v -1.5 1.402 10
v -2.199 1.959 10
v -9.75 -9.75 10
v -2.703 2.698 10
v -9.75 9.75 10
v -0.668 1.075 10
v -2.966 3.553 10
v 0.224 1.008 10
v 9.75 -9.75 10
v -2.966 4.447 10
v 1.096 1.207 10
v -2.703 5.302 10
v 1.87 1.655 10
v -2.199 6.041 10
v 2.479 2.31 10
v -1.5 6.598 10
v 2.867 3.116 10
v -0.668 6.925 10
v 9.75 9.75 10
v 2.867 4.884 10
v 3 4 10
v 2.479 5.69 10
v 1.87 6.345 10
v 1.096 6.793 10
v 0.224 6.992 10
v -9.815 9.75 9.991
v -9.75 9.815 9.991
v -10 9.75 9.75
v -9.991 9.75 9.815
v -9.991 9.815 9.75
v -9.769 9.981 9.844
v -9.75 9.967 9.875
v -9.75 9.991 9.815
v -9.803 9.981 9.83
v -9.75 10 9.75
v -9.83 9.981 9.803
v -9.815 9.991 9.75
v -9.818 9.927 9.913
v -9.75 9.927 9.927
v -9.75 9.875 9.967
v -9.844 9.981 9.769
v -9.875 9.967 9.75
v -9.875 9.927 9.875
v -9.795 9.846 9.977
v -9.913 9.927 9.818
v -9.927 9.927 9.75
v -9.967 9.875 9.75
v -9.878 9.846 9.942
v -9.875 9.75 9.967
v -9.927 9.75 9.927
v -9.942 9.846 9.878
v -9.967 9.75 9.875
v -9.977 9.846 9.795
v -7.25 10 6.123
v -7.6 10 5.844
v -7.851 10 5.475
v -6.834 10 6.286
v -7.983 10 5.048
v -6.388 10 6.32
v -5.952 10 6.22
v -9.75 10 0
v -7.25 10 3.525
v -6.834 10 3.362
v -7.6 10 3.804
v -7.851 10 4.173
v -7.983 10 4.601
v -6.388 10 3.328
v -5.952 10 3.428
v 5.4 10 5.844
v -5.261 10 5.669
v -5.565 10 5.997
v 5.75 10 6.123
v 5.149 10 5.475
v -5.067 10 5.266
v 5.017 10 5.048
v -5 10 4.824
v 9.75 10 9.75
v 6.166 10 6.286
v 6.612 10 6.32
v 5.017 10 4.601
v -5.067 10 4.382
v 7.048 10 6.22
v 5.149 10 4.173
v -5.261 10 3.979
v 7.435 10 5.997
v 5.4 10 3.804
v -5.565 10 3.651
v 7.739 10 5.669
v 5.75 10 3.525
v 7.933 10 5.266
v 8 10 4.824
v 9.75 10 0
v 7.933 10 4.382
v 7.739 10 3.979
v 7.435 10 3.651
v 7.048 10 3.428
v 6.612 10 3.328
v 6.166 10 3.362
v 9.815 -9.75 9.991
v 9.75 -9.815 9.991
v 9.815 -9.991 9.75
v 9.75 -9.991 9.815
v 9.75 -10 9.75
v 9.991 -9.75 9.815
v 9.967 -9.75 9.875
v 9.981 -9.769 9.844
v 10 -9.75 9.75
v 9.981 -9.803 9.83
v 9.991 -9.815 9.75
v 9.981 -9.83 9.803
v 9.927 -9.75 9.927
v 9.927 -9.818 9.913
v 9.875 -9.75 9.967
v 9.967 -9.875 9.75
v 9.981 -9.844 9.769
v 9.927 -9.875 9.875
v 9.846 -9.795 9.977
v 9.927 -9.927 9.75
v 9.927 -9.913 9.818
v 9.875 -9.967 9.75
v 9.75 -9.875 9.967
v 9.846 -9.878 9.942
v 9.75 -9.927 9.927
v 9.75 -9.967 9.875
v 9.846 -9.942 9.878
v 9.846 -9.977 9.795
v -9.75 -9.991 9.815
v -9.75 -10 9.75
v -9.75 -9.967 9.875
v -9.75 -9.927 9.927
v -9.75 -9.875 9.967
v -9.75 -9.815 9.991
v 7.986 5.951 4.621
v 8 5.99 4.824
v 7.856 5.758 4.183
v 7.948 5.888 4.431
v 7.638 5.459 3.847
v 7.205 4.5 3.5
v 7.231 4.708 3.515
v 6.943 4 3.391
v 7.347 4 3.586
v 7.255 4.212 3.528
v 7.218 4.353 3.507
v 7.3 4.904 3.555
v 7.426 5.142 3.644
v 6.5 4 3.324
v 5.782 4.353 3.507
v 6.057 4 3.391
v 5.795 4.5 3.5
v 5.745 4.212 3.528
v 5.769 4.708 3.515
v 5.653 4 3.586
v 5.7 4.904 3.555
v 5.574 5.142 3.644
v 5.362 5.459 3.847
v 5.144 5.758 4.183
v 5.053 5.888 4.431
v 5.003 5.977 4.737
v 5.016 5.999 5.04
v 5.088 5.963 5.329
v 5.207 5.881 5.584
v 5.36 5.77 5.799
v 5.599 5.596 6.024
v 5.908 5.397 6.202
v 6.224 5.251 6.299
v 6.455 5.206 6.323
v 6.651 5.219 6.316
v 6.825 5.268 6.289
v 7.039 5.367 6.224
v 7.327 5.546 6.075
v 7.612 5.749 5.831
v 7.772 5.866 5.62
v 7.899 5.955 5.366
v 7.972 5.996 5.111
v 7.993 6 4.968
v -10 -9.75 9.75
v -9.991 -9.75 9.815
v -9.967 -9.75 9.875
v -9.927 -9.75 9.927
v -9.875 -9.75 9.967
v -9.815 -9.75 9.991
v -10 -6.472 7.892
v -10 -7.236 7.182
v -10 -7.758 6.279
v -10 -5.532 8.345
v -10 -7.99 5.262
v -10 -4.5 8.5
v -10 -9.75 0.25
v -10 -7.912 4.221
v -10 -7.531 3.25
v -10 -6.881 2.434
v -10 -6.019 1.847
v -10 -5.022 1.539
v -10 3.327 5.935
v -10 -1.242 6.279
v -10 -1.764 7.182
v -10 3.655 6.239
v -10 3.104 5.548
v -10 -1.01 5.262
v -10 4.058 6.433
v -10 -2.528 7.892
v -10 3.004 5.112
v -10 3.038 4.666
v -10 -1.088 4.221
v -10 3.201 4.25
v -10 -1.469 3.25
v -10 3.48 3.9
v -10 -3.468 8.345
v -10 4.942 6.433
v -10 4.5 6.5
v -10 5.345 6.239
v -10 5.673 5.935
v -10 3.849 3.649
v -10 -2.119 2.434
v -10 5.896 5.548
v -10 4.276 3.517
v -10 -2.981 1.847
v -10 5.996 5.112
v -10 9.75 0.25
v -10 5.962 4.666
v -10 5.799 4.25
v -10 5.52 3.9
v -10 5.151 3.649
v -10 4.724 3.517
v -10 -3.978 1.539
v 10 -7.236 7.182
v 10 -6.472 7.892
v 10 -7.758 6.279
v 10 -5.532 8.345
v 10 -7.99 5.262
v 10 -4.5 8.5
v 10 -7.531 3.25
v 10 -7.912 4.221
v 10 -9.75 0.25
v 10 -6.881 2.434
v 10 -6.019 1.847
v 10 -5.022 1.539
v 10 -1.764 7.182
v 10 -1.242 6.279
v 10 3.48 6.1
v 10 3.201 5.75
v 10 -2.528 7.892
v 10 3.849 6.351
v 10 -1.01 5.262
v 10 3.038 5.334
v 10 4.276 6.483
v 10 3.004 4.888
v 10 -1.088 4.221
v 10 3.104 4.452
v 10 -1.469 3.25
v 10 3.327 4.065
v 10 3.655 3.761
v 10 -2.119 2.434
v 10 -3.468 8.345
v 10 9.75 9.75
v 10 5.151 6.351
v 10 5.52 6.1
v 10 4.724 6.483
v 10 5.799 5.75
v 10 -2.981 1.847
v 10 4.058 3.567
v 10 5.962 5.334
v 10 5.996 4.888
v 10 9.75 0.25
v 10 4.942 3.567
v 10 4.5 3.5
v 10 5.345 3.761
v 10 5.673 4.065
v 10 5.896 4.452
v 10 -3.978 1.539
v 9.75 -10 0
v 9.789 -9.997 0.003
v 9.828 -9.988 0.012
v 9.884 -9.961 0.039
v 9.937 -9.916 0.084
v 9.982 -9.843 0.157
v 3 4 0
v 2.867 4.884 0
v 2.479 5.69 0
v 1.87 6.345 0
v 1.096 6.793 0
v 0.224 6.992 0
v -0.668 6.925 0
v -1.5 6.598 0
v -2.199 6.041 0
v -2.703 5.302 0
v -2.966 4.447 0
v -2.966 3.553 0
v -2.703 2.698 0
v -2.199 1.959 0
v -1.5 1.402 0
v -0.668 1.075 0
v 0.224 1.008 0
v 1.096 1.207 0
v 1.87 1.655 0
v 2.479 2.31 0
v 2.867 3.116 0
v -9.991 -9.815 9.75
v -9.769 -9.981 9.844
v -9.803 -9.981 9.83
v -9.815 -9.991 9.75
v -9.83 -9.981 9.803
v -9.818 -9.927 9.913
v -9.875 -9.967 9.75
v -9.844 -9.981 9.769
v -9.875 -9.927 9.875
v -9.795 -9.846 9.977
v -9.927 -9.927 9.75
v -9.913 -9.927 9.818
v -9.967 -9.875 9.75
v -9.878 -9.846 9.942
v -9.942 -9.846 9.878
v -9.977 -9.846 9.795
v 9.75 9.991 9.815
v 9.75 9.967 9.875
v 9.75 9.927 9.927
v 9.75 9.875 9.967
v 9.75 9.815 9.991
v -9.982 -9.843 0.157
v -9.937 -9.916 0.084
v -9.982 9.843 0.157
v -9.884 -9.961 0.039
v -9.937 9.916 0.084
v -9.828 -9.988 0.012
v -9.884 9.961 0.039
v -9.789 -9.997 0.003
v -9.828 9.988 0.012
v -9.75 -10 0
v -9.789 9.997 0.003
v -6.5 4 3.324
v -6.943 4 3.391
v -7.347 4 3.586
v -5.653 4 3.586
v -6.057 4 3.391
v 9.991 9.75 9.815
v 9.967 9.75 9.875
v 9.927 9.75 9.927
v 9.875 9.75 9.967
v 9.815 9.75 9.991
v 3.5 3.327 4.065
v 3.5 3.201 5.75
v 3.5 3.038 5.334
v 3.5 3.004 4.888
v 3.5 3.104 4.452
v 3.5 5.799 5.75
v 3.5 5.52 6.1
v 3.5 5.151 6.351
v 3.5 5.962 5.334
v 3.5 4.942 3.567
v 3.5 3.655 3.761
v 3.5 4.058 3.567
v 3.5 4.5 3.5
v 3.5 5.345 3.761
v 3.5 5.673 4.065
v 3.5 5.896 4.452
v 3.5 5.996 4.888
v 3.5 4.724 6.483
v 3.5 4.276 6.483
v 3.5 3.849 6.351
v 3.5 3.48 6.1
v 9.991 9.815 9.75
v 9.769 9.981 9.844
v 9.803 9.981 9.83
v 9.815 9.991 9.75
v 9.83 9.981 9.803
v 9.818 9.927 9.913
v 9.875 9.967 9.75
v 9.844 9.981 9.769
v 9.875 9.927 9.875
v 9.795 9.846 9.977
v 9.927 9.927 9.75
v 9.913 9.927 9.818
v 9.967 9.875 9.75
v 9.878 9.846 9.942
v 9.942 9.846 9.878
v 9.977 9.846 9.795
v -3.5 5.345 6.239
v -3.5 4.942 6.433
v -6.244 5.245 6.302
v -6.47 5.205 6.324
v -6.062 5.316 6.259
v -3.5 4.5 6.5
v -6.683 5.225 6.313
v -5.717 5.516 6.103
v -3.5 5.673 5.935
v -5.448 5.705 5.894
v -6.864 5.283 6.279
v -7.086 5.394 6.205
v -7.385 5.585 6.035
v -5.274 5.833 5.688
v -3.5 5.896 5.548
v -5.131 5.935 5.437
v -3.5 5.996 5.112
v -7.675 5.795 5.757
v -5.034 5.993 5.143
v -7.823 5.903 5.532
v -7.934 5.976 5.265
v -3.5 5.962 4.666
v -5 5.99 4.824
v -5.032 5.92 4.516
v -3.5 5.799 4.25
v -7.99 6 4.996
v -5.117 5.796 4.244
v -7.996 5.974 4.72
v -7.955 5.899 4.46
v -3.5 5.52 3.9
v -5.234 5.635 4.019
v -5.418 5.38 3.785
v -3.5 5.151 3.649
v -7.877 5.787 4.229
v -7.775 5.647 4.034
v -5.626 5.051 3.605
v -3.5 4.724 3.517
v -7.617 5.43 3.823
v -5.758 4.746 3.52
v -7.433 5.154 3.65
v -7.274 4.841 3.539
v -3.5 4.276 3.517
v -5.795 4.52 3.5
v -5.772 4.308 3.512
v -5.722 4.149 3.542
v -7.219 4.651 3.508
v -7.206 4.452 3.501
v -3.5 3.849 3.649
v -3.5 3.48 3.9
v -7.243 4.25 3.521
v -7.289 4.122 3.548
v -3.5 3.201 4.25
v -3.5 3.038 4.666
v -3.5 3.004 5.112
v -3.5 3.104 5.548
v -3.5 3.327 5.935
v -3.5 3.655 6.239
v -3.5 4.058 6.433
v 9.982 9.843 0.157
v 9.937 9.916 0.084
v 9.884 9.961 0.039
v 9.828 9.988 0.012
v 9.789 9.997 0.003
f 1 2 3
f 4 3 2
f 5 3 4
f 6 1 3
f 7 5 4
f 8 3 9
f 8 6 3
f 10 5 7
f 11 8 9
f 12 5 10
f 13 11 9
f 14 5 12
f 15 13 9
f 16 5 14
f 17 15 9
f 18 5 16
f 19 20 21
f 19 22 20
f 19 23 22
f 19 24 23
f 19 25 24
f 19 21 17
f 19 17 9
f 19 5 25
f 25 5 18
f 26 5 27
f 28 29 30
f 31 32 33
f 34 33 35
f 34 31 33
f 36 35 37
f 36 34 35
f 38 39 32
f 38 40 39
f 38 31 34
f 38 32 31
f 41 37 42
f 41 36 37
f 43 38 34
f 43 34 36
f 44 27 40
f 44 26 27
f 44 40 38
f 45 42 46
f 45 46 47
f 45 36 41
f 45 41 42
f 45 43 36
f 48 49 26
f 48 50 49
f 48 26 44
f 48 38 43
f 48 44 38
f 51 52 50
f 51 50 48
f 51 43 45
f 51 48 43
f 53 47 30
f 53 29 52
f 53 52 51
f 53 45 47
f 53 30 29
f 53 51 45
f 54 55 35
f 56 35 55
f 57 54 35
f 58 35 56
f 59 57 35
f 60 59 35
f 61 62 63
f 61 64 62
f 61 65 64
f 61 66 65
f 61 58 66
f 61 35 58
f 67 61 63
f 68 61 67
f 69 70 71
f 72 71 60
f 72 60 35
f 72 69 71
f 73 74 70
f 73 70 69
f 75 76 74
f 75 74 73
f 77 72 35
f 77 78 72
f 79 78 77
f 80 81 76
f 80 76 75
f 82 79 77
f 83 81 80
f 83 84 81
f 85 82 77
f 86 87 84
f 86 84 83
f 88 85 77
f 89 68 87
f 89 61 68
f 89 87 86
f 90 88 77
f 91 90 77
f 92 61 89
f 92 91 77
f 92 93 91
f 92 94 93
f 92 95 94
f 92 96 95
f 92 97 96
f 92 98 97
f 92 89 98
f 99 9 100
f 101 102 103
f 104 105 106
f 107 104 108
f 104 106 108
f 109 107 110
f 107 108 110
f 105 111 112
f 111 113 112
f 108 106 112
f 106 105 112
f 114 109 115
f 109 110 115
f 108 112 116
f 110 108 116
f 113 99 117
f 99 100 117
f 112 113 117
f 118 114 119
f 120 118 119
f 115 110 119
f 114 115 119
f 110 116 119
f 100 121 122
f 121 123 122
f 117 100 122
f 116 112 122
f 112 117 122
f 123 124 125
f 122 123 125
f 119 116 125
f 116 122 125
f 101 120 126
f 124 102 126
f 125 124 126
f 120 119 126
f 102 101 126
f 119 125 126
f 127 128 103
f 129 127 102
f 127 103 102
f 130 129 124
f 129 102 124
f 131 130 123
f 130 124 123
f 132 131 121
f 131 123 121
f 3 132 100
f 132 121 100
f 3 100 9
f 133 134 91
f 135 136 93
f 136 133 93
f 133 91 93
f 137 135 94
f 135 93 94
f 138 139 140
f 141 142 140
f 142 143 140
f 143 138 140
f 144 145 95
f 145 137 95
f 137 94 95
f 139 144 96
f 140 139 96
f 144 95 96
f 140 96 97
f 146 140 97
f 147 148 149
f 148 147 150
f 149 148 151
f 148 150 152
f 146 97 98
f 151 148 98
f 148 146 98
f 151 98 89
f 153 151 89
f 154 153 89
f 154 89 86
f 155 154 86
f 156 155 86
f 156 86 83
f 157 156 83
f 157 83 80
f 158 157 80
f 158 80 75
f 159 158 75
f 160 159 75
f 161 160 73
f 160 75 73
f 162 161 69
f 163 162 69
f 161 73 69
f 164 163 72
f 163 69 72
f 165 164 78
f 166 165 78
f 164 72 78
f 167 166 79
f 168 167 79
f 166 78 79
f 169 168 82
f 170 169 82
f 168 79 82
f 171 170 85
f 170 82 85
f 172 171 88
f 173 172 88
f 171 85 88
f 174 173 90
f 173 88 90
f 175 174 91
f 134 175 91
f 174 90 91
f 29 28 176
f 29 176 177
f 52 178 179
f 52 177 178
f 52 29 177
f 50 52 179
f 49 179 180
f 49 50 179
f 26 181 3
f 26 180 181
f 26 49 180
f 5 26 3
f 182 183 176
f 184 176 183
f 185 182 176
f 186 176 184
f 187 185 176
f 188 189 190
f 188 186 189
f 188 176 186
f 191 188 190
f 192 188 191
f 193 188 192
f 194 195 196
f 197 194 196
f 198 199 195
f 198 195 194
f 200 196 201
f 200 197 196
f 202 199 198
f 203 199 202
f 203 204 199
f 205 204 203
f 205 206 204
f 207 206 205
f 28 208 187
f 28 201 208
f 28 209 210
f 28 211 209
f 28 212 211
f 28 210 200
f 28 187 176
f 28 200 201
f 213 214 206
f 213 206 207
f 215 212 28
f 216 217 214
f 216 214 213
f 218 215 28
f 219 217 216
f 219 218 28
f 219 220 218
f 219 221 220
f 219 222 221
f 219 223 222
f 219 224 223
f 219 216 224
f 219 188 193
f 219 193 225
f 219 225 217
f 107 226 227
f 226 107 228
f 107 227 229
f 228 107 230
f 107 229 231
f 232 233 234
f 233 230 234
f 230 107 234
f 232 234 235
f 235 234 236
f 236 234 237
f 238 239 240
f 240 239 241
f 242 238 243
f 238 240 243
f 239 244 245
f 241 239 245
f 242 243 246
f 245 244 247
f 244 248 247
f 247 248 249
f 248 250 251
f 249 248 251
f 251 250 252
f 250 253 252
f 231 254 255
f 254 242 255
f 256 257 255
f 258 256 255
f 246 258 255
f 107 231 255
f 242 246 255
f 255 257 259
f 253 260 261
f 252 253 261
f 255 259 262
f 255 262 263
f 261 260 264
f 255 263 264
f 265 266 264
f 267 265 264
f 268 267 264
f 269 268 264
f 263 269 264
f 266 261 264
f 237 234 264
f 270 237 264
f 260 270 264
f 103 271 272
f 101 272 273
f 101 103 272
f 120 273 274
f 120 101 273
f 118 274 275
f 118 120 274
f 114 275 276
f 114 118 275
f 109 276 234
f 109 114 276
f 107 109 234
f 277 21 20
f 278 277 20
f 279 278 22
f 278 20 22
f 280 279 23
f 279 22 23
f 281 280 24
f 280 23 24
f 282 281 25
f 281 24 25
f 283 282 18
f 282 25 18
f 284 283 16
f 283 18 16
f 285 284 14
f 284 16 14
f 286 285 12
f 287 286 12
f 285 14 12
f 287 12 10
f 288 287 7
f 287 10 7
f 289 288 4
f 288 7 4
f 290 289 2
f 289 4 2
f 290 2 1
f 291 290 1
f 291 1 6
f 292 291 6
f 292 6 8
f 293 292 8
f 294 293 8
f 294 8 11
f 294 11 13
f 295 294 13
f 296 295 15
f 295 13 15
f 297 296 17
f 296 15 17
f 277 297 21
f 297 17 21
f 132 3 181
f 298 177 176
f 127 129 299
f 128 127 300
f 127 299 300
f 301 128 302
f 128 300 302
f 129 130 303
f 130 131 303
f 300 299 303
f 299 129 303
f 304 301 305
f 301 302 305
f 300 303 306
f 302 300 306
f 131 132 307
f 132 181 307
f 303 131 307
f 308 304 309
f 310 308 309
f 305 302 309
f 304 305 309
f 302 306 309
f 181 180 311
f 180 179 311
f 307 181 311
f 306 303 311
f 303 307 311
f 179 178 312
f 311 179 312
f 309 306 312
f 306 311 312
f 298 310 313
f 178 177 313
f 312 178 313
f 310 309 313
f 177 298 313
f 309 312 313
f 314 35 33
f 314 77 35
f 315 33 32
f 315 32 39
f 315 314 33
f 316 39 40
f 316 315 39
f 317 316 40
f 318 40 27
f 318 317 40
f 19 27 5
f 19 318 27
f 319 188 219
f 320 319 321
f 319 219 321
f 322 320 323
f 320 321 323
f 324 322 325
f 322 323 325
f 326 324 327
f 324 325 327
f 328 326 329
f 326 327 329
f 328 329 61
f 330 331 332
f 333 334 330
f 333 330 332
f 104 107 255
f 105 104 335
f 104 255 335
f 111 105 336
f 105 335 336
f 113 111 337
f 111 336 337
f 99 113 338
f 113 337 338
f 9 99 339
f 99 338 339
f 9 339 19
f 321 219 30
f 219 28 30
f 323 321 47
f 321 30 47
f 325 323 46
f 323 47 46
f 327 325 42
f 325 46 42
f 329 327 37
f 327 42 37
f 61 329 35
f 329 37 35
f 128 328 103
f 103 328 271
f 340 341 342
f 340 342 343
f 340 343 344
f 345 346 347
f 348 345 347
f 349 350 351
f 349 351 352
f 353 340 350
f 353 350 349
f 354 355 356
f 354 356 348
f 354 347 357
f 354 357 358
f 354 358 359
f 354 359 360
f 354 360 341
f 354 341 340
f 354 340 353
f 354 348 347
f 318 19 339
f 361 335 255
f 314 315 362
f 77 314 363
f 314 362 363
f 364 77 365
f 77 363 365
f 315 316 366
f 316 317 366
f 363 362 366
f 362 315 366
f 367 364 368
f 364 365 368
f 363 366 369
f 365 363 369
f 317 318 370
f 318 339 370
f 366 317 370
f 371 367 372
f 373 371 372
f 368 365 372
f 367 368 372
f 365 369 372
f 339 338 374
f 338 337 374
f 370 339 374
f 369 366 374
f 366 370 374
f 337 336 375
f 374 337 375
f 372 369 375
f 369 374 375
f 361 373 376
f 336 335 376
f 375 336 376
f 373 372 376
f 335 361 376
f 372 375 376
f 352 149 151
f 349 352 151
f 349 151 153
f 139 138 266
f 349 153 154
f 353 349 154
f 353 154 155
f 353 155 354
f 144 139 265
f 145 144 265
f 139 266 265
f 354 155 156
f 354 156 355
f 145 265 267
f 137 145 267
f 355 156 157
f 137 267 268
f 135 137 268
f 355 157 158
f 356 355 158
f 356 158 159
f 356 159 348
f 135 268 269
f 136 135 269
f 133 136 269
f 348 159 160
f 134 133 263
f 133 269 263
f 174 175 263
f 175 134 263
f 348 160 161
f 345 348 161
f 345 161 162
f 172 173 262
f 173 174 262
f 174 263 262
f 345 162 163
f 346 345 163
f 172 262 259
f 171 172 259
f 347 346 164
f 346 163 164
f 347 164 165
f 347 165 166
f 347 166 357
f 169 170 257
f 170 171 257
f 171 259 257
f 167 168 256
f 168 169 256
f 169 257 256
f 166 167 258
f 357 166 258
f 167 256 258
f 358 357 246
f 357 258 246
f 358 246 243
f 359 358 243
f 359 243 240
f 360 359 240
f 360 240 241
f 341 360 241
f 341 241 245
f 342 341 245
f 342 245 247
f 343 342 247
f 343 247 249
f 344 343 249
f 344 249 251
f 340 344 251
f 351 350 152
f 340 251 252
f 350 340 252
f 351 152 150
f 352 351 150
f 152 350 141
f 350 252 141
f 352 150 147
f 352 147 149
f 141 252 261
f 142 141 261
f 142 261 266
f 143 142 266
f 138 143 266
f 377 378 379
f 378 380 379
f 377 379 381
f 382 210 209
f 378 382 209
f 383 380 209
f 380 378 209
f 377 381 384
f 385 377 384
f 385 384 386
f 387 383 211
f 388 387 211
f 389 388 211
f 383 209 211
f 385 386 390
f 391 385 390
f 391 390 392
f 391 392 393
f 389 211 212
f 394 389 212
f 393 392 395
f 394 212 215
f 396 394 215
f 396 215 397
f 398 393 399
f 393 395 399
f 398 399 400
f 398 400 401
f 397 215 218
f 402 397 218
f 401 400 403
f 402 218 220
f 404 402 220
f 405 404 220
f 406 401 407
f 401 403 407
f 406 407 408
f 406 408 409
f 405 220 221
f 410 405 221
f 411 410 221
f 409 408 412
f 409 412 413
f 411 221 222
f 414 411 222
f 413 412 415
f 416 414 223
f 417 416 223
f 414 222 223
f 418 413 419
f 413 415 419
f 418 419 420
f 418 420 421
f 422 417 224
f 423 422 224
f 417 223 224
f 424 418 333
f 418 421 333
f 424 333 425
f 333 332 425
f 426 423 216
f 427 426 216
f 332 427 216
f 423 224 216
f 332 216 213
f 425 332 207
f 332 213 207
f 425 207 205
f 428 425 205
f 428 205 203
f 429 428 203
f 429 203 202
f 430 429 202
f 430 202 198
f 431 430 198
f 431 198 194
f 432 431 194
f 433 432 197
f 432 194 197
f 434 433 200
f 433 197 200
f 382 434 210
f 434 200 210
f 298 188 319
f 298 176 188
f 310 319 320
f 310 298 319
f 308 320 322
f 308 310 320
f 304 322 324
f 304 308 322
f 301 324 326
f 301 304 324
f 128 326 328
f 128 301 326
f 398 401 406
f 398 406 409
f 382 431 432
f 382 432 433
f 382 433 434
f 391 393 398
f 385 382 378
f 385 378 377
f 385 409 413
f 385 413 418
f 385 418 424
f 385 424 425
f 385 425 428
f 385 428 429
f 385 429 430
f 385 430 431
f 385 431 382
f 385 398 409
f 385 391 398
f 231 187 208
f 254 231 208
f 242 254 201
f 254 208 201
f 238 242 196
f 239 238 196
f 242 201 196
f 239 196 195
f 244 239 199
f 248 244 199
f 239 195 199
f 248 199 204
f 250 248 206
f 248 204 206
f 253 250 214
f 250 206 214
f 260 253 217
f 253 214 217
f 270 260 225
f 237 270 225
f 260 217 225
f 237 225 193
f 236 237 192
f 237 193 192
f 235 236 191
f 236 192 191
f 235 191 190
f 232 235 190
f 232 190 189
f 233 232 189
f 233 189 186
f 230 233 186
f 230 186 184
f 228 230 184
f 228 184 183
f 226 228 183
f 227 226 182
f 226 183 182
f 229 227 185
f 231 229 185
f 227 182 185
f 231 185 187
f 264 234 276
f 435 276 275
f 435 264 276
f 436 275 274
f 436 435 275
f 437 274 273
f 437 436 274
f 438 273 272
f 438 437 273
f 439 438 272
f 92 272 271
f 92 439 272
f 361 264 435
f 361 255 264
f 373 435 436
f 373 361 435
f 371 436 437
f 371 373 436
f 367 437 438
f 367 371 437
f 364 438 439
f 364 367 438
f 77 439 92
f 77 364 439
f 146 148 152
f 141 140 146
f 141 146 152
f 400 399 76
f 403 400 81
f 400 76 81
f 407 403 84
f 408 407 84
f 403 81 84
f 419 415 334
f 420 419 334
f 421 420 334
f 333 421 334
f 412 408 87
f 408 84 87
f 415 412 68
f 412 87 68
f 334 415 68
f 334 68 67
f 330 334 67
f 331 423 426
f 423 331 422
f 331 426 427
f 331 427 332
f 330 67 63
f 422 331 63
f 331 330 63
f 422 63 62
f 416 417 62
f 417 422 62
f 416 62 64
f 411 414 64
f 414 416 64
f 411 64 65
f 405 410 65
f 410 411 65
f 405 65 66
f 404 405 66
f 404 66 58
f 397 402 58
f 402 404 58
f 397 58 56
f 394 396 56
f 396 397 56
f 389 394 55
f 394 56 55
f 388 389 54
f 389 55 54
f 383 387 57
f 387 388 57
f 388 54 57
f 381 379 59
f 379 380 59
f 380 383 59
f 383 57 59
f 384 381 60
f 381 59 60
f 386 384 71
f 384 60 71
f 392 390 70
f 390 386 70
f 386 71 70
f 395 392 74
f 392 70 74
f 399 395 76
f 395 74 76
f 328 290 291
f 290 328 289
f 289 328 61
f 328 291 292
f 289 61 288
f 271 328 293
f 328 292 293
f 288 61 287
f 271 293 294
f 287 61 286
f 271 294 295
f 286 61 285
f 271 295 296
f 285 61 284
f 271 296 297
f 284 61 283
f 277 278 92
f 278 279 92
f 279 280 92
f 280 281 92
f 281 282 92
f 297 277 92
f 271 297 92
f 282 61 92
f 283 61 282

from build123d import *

# Parameters (mm, degrees)
SKETCH1_W           = 20
SKETCH1_H           = 20
BOSS_EXTRUDE1_DEPTH = 10
FILLET1_R           = 0.25
SKETCH2_R           = 3
CUT_EXTRUDE1_DEPTH  = 10
SKETCH3_R           = 3.5
CUT_EXTRUDE2_DEPTH  = 20
SKETCH4_R           = 1.5
CUT_EXTRUDE3_DEPTH  = 6.5
SKETCH5_R           = 1.5
CUT_EXTRUDE4_DEPTH  = 6.5
SKETCH6_R           = 1.5
CUT_EXTRUDE5_DEPTH  = 6


with BuildPart() as part:
    # Sketch1 → Boss-Extrude1 (new body)
    with BuildSketch(Plane.XY):
        Rectangle(SKETCH1_W, SKETCH1_H)
    extrude(amount=BOSS_EXTRUDE1_DEPTH)

    # Fillet1
    fillet1_edges = [part.edges().sort_by_distance(p)[0] for p in [
        (-10, 0, 10),
        (0, -10, 10),
        (10, 0, 10),
        (-10, 0, 0),
        (10, 0, 0),
        (0, 10, 10),
        (10, -10, 5),
        (-10, -10, 5),
        (-10, 10, 5),
        (10, 10, 5),
    ]]
    fillet(fillet1_edges, radius=FILLET1_R)

    # Sketch2 → Cut-Extrude1 (cut)
    with BuildSketch(Plane.XY.offset(10)):
        with Locations((0, 4)):
            Circle(SKETCH2_R)
    extrude(amount=-CUT_EXTRUDE1_DEPTH, mode=Mode.SUBTRACT)

    # Sketch3 → Cut-Extrude2 (cut)
    with BuildSketch(Plane.ZY.offset(10)):
        with Locations((5, -4.5)):
            Circle(SKETCH3_R)
    extrude(amount=-CUT_EXTRUDE2_DEPTH, mode=Mode.SUBTRACT)

    # Sketch4 → Cut-Extrude3 (cut)
    with BuildSketch(Plane.ZY.offset(10)):
        with Locations((5, 4.5)):
            Circle(SKETCH4_R)
    extrude(amount=-CUT_EXTRUDE3_DEPTH, mode=Mode.SUBTRACT)

    # Sketch5 → Cut-Extrude4 (cut)
    with BuildSketch(Plane(origin=(10, 0, 0), x_dir=(0, 0, -1), z_dir=(1, 0, 0))):
        with Locations((-5, 4.5)):
            Circle(SKETCH5_R)
    extrude(amount=-CUT_EXTRUDE4_DEPTH, mode=Mode.SUBTRACT)

    # Sketch6 → Cut-Extrude5 (cut)
    with BuildSketch(Plane(origin=(0, 10, 0), x_dir=(1, 0, 0), z_dir=(0, 1, 0))):
        with Locations((-6.5, -4.824104789)):
            Circle(SKETCH6_R)
        with Locations((6.5, -4.824104789)):
            Circle(SKETCH6_R)
    extrude(amount=-CUT_EXTRUDE5_DEPTH, mode=Mode.SUBTRACT)


solid = part.part
